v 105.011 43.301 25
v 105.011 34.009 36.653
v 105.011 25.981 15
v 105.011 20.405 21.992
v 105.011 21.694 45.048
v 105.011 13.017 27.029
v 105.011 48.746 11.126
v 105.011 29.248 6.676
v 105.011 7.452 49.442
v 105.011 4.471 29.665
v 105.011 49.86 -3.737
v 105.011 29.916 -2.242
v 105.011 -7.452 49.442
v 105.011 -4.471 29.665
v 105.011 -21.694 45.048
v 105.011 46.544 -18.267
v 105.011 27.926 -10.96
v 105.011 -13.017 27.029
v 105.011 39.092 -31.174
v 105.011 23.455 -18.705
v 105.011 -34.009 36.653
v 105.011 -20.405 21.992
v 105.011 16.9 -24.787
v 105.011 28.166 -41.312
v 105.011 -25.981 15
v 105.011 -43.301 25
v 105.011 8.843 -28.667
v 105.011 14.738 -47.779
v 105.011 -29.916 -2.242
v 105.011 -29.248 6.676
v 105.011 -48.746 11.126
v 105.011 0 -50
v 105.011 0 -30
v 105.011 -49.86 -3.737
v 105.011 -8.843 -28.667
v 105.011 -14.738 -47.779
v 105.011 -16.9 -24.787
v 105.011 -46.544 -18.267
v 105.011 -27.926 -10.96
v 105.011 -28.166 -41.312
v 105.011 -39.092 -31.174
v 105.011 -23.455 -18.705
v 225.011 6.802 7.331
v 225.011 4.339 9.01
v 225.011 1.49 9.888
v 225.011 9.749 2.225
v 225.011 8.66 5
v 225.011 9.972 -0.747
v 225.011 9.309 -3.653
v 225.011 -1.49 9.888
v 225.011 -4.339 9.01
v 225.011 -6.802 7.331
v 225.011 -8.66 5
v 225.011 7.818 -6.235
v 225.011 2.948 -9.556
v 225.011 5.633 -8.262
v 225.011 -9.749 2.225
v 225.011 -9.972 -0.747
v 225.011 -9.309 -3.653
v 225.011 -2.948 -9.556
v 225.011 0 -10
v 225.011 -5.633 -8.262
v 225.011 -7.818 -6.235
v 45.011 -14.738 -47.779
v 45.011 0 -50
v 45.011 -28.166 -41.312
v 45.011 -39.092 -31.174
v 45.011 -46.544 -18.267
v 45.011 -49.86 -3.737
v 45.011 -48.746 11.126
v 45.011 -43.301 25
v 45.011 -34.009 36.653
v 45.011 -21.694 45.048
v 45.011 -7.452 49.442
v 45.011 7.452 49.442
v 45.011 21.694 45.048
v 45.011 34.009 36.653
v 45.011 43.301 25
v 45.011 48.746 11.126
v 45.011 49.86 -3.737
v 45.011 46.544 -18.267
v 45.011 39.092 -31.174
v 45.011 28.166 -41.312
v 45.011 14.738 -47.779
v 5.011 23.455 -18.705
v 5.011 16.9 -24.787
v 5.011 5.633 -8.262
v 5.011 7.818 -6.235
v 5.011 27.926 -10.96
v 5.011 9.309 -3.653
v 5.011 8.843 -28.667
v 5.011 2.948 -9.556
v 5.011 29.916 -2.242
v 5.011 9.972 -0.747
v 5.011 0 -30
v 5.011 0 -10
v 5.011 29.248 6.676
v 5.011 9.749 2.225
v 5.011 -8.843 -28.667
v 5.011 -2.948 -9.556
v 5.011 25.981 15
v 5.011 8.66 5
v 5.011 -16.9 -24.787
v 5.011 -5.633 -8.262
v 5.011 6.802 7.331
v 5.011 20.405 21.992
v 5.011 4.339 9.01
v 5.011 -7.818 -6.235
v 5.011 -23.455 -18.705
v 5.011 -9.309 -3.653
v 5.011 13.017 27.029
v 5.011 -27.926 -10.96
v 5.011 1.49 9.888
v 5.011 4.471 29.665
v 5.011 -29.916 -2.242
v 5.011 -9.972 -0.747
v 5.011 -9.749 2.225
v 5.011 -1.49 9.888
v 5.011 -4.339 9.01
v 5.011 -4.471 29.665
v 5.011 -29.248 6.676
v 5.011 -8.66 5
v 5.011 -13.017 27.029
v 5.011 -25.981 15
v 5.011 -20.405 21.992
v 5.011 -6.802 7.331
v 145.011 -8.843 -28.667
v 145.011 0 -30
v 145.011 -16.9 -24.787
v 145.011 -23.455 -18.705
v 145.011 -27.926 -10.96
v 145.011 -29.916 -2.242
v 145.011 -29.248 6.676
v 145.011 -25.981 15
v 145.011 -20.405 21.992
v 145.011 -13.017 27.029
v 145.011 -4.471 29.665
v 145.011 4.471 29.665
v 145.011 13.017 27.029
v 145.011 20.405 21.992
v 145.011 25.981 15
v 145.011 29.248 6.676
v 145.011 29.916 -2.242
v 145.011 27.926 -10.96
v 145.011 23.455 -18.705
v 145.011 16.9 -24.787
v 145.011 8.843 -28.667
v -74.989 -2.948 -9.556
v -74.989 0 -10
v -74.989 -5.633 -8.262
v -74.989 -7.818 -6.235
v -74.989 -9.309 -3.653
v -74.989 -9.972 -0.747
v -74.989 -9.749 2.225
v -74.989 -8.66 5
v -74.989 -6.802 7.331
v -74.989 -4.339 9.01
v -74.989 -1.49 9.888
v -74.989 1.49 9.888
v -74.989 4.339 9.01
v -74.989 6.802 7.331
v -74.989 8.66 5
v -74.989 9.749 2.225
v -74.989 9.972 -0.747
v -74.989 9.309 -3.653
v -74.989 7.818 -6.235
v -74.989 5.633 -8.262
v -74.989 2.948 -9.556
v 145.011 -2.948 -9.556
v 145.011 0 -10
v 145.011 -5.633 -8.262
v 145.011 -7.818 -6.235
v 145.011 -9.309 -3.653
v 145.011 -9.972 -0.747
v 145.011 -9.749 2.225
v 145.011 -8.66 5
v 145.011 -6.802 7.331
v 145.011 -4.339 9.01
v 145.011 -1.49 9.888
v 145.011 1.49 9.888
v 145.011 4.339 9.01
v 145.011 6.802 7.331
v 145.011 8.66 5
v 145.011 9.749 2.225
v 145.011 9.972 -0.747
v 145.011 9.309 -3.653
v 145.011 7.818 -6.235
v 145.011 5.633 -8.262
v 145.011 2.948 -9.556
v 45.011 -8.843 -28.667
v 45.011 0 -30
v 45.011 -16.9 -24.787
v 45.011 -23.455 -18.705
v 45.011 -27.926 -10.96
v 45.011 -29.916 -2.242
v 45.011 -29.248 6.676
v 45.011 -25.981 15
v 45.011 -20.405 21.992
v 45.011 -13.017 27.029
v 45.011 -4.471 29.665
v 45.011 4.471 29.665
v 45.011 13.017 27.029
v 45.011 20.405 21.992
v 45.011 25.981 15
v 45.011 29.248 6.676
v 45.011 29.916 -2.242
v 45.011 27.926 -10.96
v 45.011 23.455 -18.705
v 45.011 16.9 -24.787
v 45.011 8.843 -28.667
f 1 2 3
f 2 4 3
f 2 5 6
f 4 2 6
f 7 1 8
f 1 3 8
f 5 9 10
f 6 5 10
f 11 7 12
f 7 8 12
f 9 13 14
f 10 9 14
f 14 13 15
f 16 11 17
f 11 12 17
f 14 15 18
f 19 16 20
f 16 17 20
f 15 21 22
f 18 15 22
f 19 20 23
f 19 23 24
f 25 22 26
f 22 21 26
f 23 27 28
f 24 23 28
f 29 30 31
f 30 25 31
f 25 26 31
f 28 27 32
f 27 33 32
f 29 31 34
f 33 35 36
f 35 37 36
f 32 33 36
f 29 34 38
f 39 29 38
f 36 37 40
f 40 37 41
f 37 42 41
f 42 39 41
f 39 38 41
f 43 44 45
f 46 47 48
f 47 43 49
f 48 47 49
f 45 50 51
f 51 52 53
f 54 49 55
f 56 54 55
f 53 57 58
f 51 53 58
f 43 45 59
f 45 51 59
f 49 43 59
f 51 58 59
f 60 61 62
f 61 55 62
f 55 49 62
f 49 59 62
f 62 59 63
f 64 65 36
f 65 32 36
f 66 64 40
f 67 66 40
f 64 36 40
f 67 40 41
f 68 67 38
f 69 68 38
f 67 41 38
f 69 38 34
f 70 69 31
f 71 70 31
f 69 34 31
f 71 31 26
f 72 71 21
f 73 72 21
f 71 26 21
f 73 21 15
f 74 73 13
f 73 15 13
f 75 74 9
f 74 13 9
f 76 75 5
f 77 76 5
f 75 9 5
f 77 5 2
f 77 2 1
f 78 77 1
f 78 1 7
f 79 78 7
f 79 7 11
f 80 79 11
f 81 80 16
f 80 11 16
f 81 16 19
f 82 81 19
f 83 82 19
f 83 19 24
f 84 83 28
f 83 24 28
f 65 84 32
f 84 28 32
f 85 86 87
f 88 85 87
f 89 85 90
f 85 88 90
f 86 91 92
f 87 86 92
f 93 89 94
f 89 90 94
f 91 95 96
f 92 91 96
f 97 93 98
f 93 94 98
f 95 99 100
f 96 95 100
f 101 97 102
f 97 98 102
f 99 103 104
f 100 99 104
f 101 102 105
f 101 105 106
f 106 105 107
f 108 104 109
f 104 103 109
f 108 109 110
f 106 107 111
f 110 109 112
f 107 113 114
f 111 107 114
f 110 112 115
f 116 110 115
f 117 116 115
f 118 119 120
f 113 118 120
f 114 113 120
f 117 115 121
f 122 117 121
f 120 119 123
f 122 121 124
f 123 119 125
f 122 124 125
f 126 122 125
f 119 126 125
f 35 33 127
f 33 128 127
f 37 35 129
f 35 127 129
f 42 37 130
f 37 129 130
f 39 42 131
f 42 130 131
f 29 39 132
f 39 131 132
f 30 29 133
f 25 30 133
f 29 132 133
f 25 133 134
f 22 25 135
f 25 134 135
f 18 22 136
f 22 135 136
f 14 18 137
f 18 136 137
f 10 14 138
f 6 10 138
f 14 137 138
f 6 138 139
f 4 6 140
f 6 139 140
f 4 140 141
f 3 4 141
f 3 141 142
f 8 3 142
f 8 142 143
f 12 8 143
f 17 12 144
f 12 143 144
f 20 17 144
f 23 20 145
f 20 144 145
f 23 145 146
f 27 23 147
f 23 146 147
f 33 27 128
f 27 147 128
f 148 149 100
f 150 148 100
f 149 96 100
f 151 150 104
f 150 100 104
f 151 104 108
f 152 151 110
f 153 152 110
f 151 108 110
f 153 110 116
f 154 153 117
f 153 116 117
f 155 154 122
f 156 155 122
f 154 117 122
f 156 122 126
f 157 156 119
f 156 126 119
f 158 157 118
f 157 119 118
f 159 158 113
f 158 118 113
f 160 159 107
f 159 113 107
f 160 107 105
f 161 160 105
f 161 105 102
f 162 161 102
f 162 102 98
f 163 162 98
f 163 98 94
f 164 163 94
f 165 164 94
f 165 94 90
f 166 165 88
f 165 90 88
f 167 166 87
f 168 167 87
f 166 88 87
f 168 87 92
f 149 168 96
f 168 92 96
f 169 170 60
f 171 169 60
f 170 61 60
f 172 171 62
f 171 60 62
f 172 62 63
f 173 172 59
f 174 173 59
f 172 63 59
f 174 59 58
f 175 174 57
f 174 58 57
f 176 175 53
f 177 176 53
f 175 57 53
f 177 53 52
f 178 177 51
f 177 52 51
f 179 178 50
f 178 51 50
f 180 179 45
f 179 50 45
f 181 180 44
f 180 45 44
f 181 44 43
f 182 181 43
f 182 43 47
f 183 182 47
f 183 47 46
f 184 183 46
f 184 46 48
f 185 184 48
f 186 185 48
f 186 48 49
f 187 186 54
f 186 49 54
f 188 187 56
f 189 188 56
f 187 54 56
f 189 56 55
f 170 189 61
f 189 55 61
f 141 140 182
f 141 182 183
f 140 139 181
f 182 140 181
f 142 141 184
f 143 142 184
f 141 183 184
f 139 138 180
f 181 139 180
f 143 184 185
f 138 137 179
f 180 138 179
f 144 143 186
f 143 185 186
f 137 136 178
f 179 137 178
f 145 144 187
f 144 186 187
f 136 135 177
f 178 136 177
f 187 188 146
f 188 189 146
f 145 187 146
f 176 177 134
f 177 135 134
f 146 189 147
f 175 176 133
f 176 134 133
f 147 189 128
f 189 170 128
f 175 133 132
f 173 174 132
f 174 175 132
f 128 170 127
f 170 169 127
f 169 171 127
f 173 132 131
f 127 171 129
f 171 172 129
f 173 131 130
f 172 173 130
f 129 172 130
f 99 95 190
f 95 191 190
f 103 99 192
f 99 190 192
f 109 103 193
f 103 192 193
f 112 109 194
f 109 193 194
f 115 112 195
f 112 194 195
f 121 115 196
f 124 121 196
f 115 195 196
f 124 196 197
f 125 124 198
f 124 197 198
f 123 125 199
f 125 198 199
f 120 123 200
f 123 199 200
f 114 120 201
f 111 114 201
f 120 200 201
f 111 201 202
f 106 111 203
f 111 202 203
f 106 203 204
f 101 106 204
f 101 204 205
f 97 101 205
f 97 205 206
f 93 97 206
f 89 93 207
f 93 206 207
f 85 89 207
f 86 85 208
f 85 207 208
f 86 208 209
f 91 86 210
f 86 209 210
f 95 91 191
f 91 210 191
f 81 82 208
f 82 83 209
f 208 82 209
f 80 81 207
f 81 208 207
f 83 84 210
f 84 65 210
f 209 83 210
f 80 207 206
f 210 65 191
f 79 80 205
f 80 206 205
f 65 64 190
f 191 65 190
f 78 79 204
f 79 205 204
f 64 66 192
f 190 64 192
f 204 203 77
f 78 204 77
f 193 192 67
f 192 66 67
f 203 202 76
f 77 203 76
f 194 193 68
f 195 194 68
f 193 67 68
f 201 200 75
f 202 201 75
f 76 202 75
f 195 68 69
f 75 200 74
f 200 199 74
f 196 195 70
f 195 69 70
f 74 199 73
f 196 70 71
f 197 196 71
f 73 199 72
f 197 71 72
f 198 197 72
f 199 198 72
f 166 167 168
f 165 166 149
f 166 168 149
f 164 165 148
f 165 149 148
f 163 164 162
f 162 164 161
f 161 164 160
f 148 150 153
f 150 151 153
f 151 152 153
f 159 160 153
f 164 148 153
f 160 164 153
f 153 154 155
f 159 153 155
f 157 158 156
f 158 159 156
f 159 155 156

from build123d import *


with BuildPart() as part:
    # Sketch2 → Revolve1 (revolve)
    with BuildSketch(Plane(origin=(0, 0, 0), x_dir=(1, 0, 0), z_dir=(0, 1, 0)), mode=Mode.PRIVATE) as revolve1_sk:
        Polygon((45.011364727, -30), (45.011364727, -50), (105.011364727, -50), (105.011364727, -30), (145.011364727, -30), (145.011364727, -10), (225.011364727, -10), (225.011364727, 0), (-74.988635273, 0), (-74.988635273, -10), (5.011364727, -10), (5.011364727, -30), align=None)
    revolve(revolve1_sk.sketch.rotate(Axis((0, 0, 0), (-1, 0, 0)), 180), axis=Axis((0, 0, 0), (-1, 0, 0)))  # turned: the seam where the file's is


solid = part.part
